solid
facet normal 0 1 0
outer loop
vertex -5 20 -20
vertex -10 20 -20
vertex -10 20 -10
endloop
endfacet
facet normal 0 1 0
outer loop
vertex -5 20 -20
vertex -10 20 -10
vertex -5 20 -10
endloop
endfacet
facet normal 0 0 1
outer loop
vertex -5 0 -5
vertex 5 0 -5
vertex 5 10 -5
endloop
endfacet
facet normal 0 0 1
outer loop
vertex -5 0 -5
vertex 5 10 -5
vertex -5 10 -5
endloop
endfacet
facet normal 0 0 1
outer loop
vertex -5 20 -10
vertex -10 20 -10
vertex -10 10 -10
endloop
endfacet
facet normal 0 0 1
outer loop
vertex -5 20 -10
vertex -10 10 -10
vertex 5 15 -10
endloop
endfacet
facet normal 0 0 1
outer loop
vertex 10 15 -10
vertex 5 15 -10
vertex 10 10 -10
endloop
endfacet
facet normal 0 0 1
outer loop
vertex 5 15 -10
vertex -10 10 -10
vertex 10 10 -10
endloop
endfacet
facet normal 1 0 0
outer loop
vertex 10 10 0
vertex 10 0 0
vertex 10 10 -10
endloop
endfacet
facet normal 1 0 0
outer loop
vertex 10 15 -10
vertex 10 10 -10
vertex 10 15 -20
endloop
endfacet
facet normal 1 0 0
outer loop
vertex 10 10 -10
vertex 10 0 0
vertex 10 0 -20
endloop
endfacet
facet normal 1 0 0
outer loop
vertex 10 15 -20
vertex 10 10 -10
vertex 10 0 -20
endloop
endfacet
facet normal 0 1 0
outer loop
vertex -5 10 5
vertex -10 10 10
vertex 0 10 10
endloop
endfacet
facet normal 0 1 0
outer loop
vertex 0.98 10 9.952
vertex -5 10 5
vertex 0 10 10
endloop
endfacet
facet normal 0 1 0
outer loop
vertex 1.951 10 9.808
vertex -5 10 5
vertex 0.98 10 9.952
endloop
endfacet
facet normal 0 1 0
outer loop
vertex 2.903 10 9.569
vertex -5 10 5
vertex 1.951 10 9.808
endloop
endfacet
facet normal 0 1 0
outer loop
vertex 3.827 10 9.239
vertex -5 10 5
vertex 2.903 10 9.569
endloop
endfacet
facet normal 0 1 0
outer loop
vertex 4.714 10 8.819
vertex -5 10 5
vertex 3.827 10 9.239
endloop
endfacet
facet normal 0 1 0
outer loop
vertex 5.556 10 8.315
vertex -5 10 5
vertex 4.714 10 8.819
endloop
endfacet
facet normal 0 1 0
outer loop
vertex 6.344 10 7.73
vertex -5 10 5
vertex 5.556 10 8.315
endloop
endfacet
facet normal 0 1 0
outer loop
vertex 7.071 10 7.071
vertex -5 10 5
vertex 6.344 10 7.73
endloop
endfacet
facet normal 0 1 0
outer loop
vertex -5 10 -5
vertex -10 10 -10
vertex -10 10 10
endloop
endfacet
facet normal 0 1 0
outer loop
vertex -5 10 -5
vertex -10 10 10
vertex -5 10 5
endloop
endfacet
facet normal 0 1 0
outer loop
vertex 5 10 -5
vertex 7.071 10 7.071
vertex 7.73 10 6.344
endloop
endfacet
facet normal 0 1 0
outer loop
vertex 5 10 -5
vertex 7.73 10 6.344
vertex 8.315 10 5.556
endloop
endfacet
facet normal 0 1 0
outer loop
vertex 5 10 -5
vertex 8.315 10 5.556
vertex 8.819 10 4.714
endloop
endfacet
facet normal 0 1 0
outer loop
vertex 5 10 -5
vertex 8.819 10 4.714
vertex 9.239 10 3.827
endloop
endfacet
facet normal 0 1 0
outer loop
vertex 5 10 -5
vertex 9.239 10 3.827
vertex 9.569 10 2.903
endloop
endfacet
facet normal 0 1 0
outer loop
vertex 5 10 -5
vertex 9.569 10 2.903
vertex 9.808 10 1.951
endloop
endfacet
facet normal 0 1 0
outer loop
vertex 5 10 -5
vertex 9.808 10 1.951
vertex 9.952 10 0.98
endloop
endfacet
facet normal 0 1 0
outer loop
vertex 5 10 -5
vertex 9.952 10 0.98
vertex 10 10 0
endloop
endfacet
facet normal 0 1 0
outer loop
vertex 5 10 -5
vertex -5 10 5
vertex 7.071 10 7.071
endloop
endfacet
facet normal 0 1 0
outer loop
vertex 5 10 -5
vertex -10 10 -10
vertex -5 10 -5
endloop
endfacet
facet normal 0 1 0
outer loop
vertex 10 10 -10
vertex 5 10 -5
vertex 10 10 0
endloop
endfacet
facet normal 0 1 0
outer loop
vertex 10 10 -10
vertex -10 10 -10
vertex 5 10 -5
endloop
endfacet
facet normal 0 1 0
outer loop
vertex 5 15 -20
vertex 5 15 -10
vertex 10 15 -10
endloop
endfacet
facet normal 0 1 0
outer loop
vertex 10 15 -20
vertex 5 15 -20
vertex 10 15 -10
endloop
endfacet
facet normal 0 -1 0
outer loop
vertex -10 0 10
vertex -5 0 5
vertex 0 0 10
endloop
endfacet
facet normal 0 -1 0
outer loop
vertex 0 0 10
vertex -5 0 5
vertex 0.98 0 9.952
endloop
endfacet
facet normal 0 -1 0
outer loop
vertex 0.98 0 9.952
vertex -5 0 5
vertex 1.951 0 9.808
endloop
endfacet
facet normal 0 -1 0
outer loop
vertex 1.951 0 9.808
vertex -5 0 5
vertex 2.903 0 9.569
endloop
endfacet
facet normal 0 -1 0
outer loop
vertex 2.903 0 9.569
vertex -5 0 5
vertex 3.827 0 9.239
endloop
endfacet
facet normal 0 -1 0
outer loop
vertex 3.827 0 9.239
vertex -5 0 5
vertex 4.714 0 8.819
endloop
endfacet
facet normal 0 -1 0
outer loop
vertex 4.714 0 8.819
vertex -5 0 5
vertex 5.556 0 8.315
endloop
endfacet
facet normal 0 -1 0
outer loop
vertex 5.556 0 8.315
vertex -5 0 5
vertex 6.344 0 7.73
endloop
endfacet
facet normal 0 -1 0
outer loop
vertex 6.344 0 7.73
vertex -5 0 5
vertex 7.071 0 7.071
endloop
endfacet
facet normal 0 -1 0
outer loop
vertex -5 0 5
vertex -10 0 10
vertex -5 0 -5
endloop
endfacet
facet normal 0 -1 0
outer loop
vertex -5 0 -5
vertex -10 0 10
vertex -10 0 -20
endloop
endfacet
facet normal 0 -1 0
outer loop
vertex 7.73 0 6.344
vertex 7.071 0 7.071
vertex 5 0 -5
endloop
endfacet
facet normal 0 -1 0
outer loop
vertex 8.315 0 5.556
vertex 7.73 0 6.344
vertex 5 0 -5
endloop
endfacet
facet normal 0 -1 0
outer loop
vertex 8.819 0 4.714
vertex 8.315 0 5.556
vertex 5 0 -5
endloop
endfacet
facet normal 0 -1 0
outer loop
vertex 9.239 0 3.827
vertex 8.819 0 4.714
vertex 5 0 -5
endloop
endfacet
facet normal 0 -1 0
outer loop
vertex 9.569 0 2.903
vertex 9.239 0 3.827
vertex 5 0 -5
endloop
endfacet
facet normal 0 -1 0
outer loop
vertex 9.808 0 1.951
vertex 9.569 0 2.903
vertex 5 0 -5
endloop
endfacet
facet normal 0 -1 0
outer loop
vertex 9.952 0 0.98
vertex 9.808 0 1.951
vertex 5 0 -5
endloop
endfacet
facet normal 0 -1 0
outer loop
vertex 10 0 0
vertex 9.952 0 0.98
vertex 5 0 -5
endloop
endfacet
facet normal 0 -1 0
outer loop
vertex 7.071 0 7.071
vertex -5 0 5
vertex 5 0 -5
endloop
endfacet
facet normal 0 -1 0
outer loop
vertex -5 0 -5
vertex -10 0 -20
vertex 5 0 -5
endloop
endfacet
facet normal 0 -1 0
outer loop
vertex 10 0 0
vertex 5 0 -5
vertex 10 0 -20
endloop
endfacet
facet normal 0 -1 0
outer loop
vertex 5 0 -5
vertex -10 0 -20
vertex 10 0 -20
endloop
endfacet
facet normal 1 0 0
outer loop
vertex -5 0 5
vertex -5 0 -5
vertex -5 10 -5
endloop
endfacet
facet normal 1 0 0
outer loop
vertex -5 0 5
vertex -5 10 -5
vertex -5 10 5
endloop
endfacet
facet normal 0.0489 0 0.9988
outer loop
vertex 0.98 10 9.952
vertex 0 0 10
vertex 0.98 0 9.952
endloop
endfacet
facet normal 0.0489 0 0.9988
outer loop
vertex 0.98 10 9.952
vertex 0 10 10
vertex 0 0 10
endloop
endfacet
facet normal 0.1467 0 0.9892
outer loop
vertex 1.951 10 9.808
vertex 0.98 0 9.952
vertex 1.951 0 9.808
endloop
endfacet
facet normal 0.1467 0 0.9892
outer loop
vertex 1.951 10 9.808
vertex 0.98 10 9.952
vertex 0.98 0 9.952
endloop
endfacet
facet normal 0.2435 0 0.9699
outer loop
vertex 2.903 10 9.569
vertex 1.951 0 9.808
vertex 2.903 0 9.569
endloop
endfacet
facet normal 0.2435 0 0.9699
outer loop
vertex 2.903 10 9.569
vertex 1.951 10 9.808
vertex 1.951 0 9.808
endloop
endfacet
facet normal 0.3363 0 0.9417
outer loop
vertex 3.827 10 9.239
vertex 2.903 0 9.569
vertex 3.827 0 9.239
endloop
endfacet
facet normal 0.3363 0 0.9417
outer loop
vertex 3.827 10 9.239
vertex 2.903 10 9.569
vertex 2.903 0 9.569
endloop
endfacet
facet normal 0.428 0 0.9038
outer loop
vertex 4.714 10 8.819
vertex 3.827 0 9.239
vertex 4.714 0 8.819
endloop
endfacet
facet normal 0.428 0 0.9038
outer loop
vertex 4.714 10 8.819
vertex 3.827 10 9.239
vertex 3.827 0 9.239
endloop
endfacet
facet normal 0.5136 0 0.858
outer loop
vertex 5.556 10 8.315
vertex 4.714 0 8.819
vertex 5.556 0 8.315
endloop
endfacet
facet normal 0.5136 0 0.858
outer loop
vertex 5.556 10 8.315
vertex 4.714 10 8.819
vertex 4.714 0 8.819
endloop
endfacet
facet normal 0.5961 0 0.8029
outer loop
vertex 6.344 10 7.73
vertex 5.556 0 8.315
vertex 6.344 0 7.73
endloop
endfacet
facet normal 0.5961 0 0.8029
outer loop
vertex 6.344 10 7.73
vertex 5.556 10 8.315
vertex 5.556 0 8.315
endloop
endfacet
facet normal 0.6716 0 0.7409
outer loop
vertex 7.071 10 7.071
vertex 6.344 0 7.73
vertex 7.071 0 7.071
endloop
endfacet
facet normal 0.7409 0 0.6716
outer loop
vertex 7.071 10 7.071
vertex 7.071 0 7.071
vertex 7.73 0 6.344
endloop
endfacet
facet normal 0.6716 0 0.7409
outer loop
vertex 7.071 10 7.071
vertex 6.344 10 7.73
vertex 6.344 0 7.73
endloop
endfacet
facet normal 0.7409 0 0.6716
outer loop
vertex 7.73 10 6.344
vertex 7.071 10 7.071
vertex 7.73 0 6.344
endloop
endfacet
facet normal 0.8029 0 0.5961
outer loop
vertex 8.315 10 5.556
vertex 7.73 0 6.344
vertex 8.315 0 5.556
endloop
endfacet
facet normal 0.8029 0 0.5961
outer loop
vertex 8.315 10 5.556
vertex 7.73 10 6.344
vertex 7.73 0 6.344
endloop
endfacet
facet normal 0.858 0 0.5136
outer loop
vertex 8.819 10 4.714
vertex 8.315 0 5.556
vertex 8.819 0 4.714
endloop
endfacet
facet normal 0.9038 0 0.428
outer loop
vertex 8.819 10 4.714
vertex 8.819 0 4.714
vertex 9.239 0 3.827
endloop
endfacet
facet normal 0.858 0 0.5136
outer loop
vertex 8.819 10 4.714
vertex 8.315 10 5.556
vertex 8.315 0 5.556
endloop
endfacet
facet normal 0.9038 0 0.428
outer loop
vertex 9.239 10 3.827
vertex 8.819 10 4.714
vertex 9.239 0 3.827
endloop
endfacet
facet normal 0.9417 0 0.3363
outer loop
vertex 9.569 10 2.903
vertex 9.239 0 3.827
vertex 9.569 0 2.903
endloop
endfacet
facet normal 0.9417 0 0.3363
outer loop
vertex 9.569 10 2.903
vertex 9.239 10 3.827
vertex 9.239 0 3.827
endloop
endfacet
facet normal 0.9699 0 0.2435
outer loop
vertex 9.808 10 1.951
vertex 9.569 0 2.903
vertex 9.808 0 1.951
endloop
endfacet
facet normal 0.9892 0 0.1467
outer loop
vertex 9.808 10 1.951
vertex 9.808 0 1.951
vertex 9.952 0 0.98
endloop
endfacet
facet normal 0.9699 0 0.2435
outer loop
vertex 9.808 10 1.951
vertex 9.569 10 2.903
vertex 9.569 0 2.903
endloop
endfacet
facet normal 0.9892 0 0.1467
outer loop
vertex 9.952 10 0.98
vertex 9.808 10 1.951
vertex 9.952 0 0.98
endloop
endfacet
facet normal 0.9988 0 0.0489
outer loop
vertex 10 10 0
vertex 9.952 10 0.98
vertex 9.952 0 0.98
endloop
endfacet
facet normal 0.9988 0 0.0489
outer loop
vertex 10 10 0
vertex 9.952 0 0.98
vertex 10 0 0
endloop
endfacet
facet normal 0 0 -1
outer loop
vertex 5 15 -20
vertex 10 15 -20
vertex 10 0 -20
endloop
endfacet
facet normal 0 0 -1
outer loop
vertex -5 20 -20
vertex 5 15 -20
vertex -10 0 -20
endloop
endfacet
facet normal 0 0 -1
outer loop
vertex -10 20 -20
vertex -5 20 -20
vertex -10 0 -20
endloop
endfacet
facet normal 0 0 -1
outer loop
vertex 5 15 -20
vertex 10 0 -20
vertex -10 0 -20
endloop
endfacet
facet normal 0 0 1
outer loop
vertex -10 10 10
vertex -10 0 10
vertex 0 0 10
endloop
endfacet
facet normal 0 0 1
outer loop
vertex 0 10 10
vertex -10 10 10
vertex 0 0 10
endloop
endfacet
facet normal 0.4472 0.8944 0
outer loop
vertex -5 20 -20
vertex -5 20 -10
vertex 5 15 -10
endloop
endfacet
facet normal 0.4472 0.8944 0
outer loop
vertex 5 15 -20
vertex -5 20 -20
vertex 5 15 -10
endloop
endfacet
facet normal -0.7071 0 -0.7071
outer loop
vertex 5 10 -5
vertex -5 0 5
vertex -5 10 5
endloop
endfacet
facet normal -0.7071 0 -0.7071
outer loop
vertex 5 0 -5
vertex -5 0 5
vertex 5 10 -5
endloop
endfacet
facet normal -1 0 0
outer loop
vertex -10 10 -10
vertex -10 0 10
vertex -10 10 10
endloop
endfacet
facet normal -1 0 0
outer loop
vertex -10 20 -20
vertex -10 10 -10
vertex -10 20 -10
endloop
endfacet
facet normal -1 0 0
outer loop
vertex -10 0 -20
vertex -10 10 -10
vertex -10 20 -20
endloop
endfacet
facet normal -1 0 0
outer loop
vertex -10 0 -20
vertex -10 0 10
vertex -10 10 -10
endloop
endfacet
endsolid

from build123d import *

# Parameters (mm, degrees)
EXTRUDE_1_DEPTH     = 10
SKETCH_1_3_W        = 20
SKETCH_1_3_H        = 10
EXTRUDE_2_DEPTH     = 20
CUT_EXTRUDE_1_DEPTH = 20
FILLET_1_R          = 10


with BuildPart() as part:
    # 草圖1 → 填料-伸長1 (new body)
    with BuildSketch(Plane(origin=(0, 0, 0), x_dir=(1, 0, 0), z_dir=(0, 1, 0))):
        Polygon((-5, 10), (-10, 10), (-10, -10), (10, -10), (10, 10), (5, 10), align=None)
        Polygon((-5, 5), (5, 5), (-5, -5), align=None, mode=Mode.SUBTRACT)
    extrude(amount=EXTRUDE_1_DEPTH)

    # 草圖1<3> → 填料-伸長2 (add)
    with BuildSketch(Plane(origin=(0, 0, 0), x_dir=(1, 0, 0), z_dir=(0, 1, 0))):
        with Locations((0, 15)):
            Rectangle(SKETCH_1_3_W, SKETCH_1_3_H)
    extrude(amount=EXTRUDE_2_DEPTH)

    # 草圖2 → 除料-伸長1 (cut)
    with BuildSketch(Plane.XY.offset(-10)):
        Polygon((-5, 20), (5, 15), (10, 15), (10, 20), align=None)
    extrude(amount=-CUT_EXTRUDE_1_DEPTH, mode=Mode.SUBTRACT)

    # 圓角1
    fillet_1_edges = [part.edges().sort_by_distance(p)[0] for p in [
        (10, 5, 10),
    ]]
    fillet(fillet_1_edges, radius=FILLET_1_R)


solid = part.part
